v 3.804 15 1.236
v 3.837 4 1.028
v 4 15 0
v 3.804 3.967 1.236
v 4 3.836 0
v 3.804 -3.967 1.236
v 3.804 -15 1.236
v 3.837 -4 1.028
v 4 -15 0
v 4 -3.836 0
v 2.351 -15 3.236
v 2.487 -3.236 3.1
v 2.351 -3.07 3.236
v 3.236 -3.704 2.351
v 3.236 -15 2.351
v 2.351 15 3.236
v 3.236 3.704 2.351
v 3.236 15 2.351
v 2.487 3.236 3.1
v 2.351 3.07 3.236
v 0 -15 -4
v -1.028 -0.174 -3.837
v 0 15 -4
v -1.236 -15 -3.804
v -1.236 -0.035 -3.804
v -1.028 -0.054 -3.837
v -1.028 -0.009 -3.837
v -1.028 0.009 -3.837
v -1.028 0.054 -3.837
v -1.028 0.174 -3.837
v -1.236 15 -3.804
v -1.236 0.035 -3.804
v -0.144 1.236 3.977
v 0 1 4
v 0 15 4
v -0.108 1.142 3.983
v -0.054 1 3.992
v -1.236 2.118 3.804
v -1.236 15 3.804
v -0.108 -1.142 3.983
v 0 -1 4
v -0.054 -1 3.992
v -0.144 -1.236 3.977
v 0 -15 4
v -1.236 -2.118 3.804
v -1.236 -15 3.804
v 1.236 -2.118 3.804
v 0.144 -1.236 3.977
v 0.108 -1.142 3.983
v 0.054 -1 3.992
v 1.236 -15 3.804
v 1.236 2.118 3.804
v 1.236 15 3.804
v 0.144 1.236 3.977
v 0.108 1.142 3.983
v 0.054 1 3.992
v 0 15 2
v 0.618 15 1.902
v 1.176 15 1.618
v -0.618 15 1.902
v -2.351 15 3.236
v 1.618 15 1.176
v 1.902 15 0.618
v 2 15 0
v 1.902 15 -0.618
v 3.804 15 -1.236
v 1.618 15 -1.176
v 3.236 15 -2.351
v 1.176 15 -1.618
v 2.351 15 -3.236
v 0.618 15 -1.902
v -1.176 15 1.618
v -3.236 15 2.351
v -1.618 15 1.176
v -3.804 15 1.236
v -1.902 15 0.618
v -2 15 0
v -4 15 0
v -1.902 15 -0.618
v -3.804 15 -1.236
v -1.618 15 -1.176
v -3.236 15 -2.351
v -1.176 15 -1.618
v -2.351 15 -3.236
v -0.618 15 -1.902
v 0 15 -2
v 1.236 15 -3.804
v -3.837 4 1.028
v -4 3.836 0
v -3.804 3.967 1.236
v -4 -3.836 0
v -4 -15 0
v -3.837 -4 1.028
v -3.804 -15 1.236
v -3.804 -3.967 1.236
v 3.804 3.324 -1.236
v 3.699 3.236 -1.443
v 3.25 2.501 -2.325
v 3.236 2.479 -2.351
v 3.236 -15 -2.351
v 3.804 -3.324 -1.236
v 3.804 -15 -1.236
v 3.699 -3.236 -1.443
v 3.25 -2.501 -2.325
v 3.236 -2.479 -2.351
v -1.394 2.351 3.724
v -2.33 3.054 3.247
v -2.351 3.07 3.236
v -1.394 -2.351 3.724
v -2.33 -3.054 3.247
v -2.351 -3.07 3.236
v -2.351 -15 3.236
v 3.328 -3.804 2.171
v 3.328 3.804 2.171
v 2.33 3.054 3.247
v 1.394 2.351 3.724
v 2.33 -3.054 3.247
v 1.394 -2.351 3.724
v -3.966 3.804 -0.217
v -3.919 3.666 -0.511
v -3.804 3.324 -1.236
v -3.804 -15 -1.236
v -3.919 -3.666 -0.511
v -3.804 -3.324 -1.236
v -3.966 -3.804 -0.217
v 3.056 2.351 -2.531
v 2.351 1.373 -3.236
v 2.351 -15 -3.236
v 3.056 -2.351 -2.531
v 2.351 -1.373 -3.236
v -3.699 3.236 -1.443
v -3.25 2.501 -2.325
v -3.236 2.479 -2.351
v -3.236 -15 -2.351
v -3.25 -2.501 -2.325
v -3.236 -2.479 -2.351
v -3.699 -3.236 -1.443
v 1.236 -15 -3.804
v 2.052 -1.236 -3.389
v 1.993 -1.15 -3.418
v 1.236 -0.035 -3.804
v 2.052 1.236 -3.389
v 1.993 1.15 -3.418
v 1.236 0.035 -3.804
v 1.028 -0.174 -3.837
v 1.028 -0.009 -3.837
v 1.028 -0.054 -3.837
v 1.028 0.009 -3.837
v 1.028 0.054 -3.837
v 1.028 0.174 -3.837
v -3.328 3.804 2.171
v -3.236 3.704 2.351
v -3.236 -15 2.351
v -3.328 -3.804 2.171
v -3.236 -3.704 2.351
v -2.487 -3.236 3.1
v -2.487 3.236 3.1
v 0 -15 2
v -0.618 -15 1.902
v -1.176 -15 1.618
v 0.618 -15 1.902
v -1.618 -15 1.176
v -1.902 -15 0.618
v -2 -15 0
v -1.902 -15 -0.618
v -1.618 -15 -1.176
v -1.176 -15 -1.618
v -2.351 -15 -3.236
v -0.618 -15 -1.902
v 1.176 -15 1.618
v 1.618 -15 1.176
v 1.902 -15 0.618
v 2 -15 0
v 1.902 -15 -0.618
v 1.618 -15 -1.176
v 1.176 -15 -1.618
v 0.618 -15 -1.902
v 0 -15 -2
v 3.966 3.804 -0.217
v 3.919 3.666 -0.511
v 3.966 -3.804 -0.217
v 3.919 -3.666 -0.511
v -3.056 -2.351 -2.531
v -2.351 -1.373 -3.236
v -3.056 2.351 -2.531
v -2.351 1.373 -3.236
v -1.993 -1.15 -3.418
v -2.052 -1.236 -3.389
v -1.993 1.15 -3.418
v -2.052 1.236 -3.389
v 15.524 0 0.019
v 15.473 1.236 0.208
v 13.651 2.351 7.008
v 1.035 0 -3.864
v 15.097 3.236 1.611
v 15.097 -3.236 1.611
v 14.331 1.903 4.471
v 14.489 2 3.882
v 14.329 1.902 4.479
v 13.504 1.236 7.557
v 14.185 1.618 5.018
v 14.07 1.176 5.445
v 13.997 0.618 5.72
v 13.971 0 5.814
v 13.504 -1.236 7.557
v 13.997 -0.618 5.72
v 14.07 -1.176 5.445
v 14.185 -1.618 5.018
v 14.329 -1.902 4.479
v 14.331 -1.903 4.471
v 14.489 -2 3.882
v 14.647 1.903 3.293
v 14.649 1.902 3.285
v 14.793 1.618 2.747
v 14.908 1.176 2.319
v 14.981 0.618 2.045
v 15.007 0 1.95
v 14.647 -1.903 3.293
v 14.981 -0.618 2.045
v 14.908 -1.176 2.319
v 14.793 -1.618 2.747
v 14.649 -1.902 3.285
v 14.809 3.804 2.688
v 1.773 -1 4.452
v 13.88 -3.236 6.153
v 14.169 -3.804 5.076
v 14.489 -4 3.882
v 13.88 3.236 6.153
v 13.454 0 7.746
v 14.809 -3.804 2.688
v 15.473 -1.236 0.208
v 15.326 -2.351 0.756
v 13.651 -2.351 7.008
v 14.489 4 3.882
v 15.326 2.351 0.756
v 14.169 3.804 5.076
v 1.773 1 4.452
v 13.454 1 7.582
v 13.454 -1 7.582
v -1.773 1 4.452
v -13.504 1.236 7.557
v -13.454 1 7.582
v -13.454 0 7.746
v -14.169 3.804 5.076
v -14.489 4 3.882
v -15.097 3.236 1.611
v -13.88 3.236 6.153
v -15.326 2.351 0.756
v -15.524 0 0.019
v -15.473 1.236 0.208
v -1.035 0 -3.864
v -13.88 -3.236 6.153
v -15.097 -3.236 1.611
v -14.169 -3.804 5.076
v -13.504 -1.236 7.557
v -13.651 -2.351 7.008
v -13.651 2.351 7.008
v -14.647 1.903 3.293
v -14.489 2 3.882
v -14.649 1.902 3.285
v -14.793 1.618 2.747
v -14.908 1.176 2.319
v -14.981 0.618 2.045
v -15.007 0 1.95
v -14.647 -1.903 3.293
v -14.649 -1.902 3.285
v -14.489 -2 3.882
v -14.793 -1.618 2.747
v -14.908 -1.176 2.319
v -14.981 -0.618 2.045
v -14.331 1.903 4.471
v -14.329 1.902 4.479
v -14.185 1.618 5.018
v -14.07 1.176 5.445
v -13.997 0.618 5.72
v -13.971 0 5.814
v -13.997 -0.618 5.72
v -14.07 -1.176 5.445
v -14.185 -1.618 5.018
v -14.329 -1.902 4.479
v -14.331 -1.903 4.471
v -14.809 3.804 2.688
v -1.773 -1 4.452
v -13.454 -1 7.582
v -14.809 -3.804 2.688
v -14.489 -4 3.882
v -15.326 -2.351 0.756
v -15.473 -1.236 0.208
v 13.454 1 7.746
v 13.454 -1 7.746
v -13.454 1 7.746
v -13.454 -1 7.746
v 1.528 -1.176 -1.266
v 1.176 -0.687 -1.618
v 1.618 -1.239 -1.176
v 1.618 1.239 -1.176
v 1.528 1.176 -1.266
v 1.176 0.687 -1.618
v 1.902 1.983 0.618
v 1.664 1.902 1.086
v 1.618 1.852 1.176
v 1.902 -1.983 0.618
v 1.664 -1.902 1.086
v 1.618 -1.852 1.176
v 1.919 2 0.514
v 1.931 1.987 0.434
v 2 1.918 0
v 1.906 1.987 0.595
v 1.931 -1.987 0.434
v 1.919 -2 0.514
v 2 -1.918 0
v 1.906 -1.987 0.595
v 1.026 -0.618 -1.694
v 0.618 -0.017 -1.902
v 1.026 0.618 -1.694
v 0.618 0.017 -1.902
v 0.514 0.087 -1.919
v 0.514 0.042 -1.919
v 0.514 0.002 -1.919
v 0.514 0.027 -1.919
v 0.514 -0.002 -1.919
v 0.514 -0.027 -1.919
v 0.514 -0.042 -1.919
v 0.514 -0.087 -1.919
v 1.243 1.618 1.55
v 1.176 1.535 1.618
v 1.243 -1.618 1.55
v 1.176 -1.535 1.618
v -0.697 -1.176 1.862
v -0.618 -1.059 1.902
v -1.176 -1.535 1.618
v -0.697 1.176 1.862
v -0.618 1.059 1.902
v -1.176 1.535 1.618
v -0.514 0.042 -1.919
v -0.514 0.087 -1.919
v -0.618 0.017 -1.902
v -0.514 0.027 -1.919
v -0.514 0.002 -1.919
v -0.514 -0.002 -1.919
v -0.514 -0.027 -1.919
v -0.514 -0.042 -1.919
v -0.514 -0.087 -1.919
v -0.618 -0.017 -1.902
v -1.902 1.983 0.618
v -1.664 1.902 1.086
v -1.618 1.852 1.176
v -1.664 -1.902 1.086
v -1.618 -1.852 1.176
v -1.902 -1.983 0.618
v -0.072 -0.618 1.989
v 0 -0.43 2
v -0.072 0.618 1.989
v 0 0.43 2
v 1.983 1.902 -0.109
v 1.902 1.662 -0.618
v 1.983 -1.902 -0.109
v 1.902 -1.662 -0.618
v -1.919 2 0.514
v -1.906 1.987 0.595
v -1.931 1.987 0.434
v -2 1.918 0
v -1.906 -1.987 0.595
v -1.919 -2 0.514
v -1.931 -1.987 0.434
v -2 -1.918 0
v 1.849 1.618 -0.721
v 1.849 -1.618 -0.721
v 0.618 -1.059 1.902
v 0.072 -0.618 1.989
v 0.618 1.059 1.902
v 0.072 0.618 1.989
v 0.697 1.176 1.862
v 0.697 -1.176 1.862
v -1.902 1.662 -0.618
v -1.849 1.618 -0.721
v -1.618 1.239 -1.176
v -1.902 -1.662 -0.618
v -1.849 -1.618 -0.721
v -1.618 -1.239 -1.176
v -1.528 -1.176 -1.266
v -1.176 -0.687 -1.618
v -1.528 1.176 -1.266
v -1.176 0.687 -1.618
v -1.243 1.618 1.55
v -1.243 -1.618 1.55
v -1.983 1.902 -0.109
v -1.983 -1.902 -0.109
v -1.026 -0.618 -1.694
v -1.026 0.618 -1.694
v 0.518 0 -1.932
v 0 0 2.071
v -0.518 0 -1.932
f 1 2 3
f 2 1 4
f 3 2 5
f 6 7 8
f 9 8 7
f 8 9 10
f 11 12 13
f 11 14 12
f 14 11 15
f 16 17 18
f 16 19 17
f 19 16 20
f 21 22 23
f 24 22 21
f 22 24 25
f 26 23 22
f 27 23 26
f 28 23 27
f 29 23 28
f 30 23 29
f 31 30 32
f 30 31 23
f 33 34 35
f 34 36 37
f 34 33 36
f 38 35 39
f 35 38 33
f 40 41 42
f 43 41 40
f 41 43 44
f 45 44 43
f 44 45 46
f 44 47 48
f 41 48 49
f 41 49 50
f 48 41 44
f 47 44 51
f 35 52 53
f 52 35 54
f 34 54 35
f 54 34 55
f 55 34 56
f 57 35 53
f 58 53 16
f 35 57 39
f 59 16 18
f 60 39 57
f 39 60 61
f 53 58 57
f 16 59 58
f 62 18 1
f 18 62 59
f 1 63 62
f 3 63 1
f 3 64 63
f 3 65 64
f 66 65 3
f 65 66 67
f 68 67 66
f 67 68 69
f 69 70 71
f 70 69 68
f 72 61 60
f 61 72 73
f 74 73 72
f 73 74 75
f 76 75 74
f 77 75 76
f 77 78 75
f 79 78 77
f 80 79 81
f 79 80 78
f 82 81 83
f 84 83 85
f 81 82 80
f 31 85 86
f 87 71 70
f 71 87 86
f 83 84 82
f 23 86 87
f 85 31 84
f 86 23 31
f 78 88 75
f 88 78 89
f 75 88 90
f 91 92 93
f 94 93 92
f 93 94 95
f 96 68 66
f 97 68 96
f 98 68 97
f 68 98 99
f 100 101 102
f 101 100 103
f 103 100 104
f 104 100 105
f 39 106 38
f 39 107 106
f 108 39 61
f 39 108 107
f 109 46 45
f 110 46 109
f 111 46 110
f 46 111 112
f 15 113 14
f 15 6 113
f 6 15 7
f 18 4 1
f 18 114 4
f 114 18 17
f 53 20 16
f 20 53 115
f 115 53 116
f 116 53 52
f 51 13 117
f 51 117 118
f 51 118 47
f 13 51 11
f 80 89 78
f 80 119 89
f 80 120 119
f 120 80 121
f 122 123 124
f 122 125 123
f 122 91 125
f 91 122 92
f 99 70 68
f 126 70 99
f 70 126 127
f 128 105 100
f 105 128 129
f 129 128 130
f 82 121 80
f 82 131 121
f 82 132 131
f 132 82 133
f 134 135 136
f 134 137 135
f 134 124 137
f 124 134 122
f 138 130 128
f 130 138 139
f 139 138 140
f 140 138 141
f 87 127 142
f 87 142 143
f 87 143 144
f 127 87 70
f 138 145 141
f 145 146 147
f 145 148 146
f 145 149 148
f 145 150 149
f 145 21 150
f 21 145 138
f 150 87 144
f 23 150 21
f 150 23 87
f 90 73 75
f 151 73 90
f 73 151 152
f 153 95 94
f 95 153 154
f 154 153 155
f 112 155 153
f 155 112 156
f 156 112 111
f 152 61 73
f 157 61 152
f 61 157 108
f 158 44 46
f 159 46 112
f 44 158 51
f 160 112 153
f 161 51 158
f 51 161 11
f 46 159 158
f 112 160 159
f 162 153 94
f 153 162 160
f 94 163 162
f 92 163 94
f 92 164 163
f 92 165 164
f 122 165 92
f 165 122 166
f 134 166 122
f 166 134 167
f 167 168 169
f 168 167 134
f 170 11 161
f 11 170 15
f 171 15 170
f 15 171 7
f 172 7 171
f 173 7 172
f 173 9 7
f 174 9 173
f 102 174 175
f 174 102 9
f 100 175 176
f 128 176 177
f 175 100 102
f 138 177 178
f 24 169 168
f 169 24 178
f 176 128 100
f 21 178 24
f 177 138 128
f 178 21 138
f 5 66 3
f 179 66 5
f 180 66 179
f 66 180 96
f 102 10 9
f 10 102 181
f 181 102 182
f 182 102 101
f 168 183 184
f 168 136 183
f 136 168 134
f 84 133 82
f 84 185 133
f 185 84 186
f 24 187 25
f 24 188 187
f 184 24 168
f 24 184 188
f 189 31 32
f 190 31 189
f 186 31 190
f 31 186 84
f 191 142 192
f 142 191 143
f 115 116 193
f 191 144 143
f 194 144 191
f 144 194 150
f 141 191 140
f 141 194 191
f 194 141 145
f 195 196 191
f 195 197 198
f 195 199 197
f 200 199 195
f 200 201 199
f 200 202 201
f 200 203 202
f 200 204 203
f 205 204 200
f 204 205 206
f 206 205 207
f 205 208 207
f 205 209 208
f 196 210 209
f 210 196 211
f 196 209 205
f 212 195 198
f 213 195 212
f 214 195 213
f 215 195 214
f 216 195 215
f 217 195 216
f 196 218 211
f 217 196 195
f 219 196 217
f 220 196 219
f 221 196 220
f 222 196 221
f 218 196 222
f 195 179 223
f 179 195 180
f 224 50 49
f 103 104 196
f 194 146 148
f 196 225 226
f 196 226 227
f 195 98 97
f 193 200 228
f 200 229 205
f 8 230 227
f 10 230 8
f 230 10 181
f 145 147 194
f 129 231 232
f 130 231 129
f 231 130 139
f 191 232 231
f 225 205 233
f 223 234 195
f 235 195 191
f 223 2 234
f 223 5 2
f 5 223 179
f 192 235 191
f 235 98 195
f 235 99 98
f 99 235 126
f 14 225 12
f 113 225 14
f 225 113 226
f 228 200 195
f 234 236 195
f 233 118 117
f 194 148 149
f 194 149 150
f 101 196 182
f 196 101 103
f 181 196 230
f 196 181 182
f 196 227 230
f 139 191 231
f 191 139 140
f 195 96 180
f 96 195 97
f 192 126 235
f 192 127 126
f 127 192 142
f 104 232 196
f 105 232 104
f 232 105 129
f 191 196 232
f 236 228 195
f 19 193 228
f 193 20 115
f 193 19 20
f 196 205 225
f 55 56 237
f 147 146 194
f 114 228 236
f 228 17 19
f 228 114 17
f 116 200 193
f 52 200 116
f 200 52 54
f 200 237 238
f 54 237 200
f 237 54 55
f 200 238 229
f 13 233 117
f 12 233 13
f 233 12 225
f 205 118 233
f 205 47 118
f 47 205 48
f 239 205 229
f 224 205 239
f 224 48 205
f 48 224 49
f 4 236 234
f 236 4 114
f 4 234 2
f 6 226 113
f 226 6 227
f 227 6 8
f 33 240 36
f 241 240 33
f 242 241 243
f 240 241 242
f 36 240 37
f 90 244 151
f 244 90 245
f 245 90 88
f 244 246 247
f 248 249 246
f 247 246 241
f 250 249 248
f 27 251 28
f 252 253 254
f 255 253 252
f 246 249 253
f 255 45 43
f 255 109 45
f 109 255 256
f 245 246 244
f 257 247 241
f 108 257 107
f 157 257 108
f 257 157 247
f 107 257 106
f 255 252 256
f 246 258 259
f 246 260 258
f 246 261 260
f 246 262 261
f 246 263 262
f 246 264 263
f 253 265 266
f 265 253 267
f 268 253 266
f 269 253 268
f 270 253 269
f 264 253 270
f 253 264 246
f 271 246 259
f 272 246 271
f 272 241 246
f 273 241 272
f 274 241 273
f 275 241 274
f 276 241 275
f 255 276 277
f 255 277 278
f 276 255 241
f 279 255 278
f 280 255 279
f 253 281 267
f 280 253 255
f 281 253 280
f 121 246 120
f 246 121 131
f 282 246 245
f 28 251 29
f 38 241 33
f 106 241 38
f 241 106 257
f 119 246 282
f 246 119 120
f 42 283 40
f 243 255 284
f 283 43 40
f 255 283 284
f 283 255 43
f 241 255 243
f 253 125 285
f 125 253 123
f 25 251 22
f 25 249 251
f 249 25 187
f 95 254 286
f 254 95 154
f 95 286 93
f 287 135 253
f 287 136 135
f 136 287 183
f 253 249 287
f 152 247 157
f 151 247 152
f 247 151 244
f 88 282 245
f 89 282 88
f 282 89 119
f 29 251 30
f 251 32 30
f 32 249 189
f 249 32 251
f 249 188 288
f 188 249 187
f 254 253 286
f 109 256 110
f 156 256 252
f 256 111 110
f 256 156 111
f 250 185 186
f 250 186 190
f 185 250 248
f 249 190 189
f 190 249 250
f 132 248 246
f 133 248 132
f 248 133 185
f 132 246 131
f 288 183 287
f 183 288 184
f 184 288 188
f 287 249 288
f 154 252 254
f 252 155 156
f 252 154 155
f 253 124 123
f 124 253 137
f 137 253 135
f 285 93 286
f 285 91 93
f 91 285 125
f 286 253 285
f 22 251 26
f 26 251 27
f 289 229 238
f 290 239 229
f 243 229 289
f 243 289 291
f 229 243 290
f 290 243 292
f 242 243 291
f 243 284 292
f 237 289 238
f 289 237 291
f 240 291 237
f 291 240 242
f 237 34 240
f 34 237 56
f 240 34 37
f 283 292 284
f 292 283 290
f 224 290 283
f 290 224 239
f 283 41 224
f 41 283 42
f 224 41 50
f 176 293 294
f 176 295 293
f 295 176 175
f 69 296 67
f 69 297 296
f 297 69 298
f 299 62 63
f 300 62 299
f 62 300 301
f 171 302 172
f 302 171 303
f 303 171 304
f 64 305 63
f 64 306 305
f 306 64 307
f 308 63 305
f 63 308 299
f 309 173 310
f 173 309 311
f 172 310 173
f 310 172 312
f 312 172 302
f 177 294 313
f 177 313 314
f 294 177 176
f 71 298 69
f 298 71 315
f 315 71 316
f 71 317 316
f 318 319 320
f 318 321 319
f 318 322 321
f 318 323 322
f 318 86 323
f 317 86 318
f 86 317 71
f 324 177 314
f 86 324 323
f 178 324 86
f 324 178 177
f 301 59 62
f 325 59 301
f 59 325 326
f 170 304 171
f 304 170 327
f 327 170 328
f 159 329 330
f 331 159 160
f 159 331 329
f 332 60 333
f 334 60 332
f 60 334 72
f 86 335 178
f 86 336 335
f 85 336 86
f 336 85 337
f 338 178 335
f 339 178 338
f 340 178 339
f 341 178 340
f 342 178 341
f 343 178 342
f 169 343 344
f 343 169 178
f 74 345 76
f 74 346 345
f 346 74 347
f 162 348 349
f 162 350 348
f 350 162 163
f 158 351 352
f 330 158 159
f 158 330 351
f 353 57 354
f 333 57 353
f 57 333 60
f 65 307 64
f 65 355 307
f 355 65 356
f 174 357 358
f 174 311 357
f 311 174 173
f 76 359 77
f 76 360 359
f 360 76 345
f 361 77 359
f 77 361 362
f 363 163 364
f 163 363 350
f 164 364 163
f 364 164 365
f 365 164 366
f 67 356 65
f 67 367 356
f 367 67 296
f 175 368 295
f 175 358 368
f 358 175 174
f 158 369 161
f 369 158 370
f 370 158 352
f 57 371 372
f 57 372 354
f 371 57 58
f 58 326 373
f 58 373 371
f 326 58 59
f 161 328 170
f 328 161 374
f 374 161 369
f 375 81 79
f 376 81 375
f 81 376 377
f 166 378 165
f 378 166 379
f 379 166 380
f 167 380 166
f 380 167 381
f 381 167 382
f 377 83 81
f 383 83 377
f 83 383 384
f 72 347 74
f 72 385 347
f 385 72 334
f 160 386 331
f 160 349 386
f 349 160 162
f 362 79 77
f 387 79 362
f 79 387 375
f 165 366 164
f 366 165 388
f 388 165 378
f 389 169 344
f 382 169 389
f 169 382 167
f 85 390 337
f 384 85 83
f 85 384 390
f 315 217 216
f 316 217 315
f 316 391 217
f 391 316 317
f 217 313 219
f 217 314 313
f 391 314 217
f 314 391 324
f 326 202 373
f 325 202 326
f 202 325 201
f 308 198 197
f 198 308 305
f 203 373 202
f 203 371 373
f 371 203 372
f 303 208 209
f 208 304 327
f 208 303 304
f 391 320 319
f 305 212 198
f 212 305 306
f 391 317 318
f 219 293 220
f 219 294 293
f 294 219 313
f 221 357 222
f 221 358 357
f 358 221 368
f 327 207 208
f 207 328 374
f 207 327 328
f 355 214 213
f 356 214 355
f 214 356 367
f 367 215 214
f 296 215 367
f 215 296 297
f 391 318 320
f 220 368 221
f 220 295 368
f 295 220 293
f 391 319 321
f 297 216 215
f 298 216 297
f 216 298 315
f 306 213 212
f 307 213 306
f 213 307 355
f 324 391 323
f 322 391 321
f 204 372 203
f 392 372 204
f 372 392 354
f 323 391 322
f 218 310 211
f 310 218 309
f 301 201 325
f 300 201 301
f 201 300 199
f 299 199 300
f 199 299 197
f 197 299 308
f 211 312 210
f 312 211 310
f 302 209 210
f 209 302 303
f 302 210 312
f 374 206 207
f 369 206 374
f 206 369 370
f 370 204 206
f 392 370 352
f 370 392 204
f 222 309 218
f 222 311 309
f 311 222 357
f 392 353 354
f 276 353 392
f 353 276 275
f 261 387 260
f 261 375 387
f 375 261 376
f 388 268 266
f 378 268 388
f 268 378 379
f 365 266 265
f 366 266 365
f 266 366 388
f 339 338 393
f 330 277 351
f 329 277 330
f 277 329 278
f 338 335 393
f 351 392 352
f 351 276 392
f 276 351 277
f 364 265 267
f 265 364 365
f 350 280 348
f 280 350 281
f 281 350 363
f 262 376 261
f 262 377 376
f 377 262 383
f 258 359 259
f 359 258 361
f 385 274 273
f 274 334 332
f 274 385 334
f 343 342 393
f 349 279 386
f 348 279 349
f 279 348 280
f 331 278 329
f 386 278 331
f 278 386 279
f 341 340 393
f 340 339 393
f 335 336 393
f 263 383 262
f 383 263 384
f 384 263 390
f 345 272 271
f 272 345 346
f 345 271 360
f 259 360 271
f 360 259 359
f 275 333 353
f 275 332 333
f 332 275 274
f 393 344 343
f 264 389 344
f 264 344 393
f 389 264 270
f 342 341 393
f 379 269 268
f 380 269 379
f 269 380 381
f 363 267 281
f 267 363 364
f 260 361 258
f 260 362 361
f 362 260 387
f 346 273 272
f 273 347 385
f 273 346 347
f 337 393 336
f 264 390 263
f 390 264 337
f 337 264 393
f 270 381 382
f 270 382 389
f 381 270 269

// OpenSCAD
// Parametric dihedral connector for a diamond kite. Adjustable for different rod
// diameters and angles.
//
// Michael Ang
// http://michaelang.com
//
// For further work, please see my Polygon Construction Kit (Polycon)
// http://www.michaelang.com/project/polycon
//
// This file is licensed under Creative Commons Attribution-NonCommercial-ShareAlike 
// CC BY-NC-SA
// http://creativecommons.org/licenses/by-nc-sa/4.0/

$fn = 20;

/* [Global] */

// Dihedral angle, degrees up from horizontal
angle = 15;

// Length of the connector tubes
tube_length = 15;

// Diameter of your rod (adjust to get a tight fit)
inner_diameter = 4;

// Thickness of walls (try a multiple of your shell width)
wall_thickness = 2;

/* [Hidden] */
cut_overlap = 0.2;  // Pieces to be cut out need to go past what they're cutting

inner_radius = inner_diameter / 2;
outer_radius = inner_radius + wall_thickness;

// Create a completely solid version of the connector.
// We'll cut (difference) out the holes from the connector later.
module outer_tubes() {
	rotate([90,0,0]) {
		cylinder(r = outer_radius, h = tube_length * 2, center = true);
	}

	rotate([0,90-angle,0]) {
		cylinder(r = outer_radius, h = tube_length);
	}

	rotate([0,-(90-angle),0]) {
		cylinder(r = outer_radius, h = tube_length);
	}
}

// Create the shape that we'll cut out to make space for the rods to come into
// the connector.
module inner_tubes() {
	rotate([90,0,0]) {
		cylinder(r = inner_radius, h = tube_length * 2 + cut_overlap, center = true);
	}

	rotate([0,90-angle,0]) {
		cylinder(r = inner_radius, h = tube_length + cut_overlap);
	}

	rotate([0,-(90-angle),0]) {
		cylinder(r = inner_radius, h = tube_length + cut_overlap);
	}
}

// Use some math to make a solid brace between the angled tubes to
// make the connector stronger.
module dihedral_support(angle, inner_diameter, wall_thickness, tube_length)
{
	// Point at center of tube opening
	right_tube_center = [tube_length * cos(angle), 0, tube_length * sin(angle)];

	// Find top-right point
	outer_radius = inner_diameter / 2 + wall_thickness;
	offset_to_top_right = [-outer_radius * sin(angle), 0, outer_radius * cos(angle)];

	right_endpoint = right_tube_center + offset_to_top_right;

	width = right_endpoint[0] * 2;
	height = right_endpoint[2] - (outer_radius - 0.1);
	depth = wall_thickness;

	translate([-width/2,-depth/2,right_endpoint[2] - height]) {
		cube(size=[width, depth, height]);
	}
}

// Make the connector
difference() {
	union() {
		// Create a solid version of the connector by adding the tubes and the dihedral
	   // support.
		outer_tubes();
		dihedral_support(angle, inner_diameter, wall_thickness, tube_length);
	}
	// Subtract out the holes for the rods
	inner_tubes();
}
